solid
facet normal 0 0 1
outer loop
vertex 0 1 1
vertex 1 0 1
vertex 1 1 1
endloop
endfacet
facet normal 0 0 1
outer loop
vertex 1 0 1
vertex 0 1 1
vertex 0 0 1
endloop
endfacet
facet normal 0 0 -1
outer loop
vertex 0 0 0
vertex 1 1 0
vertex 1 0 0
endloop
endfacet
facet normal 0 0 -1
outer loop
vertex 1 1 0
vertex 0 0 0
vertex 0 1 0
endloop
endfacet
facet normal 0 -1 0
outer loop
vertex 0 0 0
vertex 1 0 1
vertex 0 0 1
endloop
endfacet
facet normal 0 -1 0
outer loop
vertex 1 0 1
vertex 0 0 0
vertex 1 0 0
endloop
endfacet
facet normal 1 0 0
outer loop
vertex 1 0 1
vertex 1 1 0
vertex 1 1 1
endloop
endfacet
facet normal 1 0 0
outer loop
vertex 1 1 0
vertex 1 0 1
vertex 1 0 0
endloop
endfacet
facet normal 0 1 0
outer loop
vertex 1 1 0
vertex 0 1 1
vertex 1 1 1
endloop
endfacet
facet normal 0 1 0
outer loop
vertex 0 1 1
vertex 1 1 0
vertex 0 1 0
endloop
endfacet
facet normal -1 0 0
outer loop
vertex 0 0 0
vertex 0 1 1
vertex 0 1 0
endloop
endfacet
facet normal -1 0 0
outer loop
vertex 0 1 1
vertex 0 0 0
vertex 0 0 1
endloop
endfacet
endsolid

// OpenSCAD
module r(n) !union(){ if (n>0) r(n-1); else cube(); }
r(50);
